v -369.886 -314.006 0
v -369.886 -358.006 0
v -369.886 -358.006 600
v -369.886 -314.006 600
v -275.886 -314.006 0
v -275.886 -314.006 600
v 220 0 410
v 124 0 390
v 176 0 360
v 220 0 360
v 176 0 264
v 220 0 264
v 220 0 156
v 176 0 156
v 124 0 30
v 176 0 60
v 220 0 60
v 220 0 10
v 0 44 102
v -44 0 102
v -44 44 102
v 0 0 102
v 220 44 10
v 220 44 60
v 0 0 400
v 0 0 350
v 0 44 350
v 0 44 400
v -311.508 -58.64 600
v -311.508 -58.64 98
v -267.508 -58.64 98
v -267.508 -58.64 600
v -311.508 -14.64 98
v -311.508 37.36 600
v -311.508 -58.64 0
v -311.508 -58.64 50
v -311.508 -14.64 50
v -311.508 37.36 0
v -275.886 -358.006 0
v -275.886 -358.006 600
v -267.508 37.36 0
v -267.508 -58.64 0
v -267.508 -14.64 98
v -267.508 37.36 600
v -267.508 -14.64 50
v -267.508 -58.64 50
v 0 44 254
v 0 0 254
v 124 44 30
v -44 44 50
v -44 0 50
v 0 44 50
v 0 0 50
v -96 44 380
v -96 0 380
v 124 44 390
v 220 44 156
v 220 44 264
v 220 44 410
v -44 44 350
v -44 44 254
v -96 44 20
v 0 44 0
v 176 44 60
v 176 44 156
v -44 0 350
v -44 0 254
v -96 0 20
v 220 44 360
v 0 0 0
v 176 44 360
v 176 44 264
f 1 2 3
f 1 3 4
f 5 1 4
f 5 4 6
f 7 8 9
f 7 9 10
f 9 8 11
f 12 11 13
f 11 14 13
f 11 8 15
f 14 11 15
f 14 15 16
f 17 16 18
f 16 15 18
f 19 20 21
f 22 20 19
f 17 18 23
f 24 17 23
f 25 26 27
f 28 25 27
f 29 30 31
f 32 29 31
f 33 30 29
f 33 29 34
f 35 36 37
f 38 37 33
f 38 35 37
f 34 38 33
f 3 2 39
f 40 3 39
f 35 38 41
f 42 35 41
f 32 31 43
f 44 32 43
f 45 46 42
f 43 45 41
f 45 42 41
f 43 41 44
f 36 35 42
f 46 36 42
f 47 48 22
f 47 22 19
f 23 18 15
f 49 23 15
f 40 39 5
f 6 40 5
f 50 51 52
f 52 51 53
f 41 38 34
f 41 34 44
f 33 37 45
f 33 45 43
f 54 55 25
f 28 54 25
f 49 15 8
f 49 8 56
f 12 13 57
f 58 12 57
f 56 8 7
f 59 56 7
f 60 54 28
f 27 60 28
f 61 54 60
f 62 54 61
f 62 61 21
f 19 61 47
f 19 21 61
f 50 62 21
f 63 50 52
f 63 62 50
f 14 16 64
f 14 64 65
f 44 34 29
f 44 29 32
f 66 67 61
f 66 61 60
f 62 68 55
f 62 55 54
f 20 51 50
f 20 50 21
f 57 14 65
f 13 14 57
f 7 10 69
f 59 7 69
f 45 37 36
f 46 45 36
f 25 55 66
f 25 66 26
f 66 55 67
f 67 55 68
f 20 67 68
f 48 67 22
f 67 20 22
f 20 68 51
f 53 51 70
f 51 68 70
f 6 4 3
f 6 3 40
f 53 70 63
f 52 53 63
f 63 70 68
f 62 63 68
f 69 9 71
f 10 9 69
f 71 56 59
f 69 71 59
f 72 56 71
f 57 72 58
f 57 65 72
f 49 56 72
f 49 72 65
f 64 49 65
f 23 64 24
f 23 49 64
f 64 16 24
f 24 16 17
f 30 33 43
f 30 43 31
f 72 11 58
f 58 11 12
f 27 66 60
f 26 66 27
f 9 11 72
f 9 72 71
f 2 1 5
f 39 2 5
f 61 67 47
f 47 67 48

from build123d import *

# Parameters (mm, degrees)
F0_W      = 96
F0_H      = 44
F1_DEPTH  = 400
F2_W      = 44
F2_H      = 96
F2_H_2    = 52
F3_DEPTH  = 44
F4_W      = 44
F4_H      = 96
F5_DEPTH  = 600
F6_W      = 44
F6_H      = 48
F7_DEPTH  = 44
F8_W      = 94
F8_H      = 44
F9_DEPTH  = 600
F11_DEPTH = 44


with BuildPart() as f1:
    # F0 (on Top) → F1 (new body)
    with BuildSketch(Plane.XY):
        with Locations((-48, 22)):
            Rectangle(F0_W, F0_H)
    extrude(amount=F1_DEPTH)

    # F2 (on face) → F3 (cut)
    with BuildSketch(Plane.XZ):
        with Locations((-22, 302)):
            Rectangle(F2_W, F2_H)
        with Locations((-22, 76)):
            Rectangle(F2_W, F2_H_2)
        Polygon((-96, 380), (0, 400), (-96, 400), align=None)
        Polygon((0, 0), (-96, 20), (-96, 0), align=None)
    extrude(amount=-F3_DEPTH, mode=Mode.SUBTRACT)


with BuildPart() as f5:
    # F4 (on Top) → F5 (new body)
    with BuildSketch(Plane.XY):
        with Locations((-289.5077912807, -10.6397461593)):
            Rectangle(F4_W, F4_H)
    extrude(amount=F5_DEPTH)

    # F6 (on face) → F7 (cut)
    with BuildSketch(Plane(origin=(-311.5077912807, 0, 0), x_dir=(0, -1, 0), z_dir=(-1, 0, 0))):
        with Locations((36.6397461593, 74)):
            Rectangle(F6_W, F6_H)
    extrude(amount=-F7_DEPTH, mode=Mode.SUBTRACT)


with BuildPart() as f9:
    # F8 (on Top) → F9 (new body)
    with BuildSketch(Plane.XY):
        with Locations((-322.8861002922, -336.0055832863)):
            Rectangle(F8_W, F8_H)
    extrude(amount=F9_DEPTH)


with BuildPart() as f10_1:
    # F10: copy of F1
    add(f1.part.moved(Location((220, 0, 10))))

    # F11 (cut): a face of the model
    f11_faces = [f10_1.faces().sort_by_distance(p)[0] for p in [
        (198, 22, 112),
    ]]
    extrude(f11_faces, amount=-F11_DEPTH, mode=Mode.SUBTRACT)


solid = Compound([f1.part, f5.part, f9.part, f10_1.part])
